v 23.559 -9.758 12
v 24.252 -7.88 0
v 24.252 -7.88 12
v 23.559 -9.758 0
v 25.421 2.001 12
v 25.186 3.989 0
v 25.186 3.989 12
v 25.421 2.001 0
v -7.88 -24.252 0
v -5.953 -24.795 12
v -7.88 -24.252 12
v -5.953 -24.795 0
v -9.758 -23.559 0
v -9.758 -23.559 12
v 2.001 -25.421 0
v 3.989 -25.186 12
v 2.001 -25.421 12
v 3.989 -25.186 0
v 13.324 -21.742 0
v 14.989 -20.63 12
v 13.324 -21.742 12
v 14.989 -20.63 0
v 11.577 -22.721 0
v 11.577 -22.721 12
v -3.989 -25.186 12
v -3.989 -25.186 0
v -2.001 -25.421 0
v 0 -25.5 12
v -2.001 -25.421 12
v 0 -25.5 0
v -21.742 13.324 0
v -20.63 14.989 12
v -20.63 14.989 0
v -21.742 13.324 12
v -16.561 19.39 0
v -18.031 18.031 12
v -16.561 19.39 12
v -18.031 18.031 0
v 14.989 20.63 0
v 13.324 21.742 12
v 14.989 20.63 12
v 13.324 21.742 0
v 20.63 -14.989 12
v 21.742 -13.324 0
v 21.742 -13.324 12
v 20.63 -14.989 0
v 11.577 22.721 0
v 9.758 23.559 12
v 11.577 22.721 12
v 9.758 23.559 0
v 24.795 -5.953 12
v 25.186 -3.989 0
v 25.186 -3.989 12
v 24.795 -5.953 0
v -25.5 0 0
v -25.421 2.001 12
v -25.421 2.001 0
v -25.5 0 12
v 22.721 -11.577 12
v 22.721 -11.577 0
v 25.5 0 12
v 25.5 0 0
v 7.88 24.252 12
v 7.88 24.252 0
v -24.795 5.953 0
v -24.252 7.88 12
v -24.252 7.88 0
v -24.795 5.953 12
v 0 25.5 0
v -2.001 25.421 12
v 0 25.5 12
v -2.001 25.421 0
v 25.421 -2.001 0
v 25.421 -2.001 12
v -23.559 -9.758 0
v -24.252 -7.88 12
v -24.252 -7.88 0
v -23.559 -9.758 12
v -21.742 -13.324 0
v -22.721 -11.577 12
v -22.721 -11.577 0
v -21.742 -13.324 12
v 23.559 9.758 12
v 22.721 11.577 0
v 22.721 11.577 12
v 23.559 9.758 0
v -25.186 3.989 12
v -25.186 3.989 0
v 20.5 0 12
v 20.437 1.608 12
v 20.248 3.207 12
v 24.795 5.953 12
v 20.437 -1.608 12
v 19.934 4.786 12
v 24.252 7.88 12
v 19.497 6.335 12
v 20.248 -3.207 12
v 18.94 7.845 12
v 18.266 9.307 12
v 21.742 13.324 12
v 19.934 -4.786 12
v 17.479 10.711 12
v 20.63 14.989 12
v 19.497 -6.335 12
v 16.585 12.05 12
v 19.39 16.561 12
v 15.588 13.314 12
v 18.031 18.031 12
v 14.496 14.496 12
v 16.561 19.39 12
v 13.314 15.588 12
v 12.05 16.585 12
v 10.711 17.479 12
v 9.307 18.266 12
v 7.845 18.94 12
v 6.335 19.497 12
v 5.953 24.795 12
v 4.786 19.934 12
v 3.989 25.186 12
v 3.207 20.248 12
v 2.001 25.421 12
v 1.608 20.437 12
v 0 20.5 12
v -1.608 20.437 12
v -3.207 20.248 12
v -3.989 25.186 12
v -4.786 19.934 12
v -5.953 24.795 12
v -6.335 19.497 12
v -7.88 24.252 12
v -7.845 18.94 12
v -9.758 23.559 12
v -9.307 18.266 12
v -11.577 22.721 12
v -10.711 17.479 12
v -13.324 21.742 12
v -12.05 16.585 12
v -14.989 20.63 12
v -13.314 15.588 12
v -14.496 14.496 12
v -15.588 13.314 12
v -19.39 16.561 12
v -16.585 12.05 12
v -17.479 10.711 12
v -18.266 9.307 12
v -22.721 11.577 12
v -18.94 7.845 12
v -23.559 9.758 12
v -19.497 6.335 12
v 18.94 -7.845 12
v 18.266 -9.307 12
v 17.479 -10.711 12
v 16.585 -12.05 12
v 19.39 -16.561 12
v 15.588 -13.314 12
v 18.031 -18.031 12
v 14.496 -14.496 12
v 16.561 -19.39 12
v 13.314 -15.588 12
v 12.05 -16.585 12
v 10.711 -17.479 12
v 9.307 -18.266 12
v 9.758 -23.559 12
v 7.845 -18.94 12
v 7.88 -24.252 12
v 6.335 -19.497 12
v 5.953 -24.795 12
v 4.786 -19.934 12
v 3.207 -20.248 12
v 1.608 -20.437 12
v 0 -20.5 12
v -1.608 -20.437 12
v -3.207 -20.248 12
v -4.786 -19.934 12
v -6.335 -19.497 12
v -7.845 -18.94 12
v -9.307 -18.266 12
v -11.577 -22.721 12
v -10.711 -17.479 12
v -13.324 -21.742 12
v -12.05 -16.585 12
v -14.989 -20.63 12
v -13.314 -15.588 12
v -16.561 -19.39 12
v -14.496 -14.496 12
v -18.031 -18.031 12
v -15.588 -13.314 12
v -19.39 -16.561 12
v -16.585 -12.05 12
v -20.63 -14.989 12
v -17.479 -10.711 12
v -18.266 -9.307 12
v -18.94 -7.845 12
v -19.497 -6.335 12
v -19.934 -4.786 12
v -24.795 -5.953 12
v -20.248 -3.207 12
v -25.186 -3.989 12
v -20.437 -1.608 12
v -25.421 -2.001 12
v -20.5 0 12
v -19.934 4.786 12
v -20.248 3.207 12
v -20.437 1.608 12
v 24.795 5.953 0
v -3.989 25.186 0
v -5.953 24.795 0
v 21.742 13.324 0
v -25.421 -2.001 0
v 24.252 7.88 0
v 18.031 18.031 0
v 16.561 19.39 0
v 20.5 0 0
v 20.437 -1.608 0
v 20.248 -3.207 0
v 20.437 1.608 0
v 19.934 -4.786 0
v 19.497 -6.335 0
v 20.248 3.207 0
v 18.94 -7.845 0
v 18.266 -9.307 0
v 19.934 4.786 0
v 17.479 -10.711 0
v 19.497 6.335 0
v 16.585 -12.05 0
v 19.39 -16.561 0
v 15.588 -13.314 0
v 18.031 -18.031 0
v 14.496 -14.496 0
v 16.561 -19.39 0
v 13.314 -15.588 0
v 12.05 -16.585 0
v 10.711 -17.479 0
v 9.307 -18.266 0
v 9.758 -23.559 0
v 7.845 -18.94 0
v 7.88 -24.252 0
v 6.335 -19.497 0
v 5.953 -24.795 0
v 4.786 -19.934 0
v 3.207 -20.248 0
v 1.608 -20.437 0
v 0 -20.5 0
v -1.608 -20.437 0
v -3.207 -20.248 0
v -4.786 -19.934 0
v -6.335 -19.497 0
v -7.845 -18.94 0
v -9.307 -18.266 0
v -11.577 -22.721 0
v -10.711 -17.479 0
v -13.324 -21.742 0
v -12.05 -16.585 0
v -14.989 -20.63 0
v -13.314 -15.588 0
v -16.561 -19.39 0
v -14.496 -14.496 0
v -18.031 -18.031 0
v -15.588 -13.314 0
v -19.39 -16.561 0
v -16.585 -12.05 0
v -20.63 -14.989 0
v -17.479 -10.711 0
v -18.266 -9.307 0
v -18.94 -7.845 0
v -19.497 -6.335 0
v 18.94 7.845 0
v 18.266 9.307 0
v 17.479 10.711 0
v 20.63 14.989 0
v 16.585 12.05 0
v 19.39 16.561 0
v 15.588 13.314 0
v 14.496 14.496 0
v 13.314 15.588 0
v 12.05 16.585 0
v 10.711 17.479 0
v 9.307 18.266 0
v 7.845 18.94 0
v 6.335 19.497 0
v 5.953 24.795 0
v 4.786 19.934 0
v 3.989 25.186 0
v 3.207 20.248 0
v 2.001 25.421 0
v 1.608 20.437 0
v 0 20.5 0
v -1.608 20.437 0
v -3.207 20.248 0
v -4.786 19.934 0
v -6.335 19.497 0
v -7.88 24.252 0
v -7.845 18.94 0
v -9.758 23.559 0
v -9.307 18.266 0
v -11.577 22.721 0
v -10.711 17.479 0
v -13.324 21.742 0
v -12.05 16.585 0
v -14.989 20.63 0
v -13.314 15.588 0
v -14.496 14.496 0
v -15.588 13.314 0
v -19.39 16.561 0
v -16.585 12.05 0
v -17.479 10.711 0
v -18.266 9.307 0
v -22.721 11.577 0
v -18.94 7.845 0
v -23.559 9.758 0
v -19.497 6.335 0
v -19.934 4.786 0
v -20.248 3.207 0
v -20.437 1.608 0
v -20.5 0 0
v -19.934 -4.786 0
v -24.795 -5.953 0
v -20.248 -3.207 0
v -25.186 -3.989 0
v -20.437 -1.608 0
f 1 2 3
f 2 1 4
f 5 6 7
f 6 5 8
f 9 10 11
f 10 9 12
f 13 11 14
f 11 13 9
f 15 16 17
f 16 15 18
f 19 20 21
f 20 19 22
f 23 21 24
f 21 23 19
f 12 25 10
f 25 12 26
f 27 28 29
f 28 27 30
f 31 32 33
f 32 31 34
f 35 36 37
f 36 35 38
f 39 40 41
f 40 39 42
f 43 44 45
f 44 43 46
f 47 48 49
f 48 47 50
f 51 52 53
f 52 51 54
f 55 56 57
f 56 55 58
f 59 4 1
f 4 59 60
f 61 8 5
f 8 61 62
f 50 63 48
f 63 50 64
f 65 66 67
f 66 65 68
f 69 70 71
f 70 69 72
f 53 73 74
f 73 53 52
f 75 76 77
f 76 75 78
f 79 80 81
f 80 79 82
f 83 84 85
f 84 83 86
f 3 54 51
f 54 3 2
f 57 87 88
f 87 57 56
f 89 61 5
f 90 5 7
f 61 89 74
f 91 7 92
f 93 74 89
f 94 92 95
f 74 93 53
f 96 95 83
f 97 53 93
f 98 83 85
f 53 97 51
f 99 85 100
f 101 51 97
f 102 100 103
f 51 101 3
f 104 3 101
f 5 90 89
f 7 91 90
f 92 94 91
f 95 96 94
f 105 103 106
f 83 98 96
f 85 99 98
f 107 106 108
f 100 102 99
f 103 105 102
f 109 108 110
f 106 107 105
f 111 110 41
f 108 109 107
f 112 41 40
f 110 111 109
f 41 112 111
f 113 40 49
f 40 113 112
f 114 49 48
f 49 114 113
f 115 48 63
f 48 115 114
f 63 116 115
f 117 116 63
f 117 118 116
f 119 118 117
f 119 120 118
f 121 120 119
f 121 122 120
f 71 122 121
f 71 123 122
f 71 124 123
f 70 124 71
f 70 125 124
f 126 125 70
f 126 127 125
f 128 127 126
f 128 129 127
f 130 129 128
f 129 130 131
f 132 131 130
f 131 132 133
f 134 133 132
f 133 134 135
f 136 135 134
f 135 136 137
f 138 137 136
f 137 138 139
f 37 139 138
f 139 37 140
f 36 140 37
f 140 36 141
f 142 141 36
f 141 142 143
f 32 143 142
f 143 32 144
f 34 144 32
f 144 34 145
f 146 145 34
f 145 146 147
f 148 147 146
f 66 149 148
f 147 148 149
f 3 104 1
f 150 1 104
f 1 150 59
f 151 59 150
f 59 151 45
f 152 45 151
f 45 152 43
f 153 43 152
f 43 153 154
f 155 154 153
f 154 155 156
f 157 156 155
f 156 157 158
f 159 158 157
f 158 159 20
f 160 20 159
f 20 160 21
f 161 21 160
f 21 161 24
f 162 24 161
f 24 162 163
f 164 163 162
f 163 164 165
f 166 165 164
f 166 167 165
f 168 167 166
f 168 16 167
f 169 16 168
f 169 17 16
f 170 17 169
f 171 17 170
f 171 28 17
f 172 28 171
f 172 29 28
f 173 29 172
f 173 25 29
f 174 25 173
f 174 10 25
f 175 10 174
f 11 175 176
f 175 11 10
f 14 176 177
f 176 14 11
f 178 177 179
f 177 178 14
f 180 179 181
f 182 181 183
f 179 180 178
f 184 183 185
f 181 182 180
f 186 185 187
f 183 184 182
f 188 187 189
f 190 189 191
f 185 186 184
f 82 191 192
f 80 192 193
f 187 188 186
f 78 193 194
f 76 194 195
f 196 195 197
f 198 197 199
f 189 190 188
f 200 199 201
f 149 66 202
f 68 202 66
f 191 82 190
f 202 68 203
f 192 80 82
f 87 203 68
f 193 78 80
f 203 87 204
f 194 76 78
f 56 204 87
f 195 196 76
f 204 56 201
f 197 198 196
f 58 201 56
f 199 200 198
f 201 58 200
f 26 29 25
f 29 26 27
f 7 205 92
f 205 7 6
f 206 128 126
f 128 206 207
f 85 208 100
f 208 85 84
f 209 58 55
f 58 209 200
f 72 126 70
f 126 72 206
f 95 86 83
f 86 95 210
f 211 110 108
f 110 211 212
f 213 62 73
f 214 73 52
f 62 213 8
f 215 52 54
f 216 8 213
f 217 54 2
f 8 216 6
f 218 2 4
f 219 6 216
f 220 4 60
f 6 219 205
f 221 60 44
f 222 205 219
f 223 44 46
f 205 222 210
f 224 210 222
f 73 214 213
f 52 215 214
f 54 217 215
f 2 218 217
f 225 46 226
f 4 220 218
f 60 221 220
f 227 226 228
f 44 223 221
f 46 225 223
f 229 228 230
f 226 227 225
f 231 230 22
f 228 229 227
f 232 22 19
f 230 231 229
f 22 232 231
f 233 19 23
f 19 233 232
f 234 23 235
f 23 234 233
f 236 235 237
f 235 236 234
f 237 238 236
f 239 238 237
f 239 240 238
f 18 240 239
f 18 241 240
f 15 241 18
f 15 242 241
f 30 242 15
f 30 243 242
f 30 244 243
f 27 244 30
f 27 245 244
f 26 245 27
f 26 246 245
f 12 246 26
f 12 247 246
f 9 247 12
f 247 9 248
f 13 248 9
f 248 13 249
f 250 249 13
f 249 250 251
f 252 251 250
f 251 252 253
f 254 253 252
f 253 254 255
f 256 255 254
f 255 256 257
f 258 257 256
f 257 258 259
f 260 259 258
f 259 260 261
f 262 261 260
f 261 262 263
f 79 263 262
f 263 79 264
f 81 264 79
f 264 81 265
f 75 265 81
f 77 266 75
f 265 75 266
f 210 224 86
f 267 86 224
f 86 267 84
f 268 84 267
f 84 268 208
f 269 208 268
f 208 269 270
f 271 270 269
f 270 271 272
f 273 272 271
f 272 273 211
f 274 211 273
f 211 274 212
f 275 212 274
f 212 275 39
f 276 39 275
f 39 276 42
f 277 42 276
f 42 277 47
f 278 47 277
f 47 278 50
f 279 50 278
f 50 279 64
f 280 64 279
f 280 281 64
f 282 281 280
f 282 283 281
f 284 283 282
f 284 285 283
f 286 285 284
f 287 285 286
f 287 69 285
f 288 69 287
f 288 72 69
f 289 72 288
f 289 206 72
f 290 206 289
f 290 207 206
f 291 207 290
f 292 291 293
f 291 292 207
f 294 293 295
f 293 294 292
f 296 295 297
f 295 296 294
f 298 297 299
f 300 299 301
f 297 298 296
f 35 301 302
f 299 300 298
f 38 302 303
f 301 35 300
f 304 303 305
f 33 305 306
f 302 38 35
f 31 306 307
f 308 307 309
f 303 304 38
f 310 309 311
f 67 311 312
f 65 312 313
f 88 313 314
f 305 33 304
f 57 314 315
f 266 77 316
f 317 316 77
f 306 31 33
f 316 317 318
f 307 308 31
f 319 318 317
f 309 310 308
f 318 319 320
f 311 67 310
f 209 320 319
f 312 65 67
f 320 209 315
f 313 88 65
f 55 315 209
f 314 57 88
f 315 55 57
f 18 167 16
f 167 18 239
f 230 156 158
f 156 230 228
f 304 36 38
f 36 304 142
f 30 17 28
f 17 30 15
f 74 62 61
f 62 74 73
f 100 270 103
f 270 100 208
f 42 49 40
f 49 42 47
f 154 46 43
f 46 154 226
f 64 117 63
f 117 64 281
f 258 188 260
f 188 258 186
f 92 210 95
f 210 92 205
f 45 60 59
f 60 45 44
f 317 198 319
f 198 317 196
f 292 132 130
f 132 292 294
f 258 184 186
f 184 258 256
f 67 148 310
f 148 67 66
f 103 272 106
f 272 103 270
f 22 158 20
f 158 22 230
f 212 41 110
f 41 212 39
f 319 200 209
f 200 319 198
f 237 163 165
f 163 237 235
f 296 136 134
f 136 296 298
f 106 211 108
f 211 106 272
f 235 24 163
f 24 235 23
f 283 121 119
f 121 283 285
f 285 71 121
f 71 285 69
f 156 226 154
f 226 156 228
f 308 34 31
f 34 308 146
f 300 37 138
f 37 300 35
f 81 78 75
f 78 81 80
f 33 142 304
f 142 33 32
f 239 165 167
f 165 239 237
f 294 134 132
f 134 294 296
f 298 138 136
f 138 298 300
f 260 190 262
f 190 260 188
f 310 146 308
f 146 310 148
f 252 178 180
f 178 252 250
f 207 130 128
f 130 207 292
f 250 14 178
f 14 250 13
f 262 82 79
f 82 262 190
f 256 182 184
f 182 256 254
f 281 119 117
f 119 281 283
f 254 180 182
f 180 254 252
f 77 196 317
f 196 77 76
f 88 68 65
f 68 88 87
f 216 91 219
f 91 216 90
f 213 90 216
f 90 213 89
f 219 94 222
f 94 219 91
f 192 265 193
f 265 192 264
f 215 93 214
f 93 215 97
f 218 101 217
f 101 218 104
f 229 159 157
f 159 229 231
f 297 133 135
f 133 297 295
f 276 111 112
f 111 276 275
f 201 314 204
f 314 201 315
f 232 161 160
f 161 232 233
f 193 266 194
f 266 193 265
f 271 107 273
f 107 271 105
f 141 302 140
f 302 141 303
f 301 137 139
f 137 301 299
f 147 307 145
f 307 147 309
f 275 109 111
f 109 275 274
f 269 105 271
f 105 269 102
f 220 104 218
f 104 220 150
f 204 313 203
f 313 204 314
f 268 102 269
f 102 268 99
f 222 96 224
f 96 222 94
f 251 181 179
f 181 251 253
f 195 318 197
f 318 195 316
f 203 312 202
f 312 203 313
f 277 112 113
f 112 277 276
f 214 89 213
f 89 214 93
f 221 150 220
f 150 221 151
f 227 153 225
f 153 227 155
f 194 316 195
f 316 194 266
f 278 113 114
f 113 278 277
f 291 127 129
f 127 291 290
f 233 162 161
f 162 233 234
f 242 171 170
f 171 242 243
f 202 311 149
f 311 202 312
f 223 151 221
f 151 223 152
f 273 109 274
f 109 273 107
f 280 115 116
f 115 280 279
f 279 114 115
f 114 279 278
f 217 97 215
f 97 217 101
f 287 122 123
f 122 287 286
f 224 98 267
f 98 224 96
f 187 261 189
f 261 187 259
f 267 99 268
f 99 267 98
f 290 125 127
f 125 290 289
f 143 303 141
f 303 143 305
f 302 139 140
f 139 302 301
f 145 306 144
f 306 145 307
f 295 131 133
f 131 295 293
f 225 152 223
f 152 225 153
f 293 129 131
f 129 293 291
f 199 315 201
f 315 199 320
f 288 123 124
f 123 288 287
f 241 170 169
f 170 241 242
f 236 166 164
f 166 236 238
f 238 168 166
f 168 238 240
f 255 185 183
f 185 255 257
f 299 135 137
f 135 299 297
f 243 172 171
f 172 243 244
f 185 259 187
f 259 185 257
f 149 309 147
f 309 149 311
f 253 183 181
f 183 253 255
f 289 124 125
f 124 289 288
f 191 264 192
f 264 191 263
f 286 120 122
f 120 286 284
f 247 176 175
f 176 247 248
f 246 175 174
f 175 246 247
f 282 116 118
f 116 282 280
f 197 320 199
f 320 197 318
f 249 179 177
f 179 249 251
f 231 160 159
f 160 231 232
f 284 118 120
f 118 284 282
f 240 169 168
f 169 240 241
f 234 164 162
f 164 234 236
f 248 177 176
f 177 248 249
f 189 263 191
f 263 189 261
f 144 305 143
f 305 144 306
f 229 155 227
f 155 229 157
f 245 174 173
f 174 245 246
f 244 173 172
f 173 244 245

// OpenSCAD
// file: variables.scad
// General

resolution = 80;
delta = 0.2;

// dimensions tubes pvc

rayon_ext_tube_32 = 16;
rayon_int_tube_32 = 13;
epaisseur_tube_32 = rayon_ext_tube_32 - rayon_int_tube_32;

rayon_ext_tube_40 = 20;
rayon_int_tube_40 = 17.5;
epaisseur_tube_40 = rayon_ext_tube_40 - rayon_int_tube_40;

ret32 = rayon_ext_tube_32;
rit32 = rayon_int_tube_32;
ep32  = epaisseur_tube_32;
ret40 = rayon_ext_tube_40;
rit40 = rayon_int_tube_40;
ep40  = epaisseur_tube_40;

// Reducteur

epaisseur_reducteur = 4;

// L'embout accueille un tube pvc de 40mm de diamètre.

hauteur_embout = 20;
rayon_int_embout = rayon_ext_tube_40 + delta;
rayon_ext_embout = 24 + delta;

hauteur_butee = 2;
rayon_int_butee = 16;

// Jonction: section de contact entre les deux pièces.

//hauteur du ressort comprimé
hauteur_ressort = 7.5;

rayon_ext_culot = rayon_ext_tube_40 - delta;
rayon_int_culot = 18 - delta;
hauteur_jonction = 30;

hauteur_totale = hauteur_jonction + hauteur_embout + hauteur_butee + hauteur_ressort;

profondeur_douille = 12;

largeur_empreinte = 6;

nb_baionette = 3;
rayon_baionette = (largeur_empreinte / 2)*0.95;
// file: common.scad
module tube(hauteur, rayon_exterieur, rayon_interieur, resolution=resolution) {
	difference(){
	  cylinder(hauteur, rayon_exterieur, rayon_exterieur, $fn=resolution);
	  translate([0,0,-1])
	 	  cylinder(hauteur + 2 , rayon_interieur, rayon_interieur, $fn=resolution);
	}
}

module donut(rayon_spheres, rayon_exterieur){
	rotate_extrude(convexity = 10, $fn = resolution)
		translate([rayon_exterieur,0,0])
		circle(r = rayon_spheres, $fn = resolution);
}
// main file
include <common.scad>;
include <variables.scad>;

tube(12, 25.5, ret40 + 0.5);
